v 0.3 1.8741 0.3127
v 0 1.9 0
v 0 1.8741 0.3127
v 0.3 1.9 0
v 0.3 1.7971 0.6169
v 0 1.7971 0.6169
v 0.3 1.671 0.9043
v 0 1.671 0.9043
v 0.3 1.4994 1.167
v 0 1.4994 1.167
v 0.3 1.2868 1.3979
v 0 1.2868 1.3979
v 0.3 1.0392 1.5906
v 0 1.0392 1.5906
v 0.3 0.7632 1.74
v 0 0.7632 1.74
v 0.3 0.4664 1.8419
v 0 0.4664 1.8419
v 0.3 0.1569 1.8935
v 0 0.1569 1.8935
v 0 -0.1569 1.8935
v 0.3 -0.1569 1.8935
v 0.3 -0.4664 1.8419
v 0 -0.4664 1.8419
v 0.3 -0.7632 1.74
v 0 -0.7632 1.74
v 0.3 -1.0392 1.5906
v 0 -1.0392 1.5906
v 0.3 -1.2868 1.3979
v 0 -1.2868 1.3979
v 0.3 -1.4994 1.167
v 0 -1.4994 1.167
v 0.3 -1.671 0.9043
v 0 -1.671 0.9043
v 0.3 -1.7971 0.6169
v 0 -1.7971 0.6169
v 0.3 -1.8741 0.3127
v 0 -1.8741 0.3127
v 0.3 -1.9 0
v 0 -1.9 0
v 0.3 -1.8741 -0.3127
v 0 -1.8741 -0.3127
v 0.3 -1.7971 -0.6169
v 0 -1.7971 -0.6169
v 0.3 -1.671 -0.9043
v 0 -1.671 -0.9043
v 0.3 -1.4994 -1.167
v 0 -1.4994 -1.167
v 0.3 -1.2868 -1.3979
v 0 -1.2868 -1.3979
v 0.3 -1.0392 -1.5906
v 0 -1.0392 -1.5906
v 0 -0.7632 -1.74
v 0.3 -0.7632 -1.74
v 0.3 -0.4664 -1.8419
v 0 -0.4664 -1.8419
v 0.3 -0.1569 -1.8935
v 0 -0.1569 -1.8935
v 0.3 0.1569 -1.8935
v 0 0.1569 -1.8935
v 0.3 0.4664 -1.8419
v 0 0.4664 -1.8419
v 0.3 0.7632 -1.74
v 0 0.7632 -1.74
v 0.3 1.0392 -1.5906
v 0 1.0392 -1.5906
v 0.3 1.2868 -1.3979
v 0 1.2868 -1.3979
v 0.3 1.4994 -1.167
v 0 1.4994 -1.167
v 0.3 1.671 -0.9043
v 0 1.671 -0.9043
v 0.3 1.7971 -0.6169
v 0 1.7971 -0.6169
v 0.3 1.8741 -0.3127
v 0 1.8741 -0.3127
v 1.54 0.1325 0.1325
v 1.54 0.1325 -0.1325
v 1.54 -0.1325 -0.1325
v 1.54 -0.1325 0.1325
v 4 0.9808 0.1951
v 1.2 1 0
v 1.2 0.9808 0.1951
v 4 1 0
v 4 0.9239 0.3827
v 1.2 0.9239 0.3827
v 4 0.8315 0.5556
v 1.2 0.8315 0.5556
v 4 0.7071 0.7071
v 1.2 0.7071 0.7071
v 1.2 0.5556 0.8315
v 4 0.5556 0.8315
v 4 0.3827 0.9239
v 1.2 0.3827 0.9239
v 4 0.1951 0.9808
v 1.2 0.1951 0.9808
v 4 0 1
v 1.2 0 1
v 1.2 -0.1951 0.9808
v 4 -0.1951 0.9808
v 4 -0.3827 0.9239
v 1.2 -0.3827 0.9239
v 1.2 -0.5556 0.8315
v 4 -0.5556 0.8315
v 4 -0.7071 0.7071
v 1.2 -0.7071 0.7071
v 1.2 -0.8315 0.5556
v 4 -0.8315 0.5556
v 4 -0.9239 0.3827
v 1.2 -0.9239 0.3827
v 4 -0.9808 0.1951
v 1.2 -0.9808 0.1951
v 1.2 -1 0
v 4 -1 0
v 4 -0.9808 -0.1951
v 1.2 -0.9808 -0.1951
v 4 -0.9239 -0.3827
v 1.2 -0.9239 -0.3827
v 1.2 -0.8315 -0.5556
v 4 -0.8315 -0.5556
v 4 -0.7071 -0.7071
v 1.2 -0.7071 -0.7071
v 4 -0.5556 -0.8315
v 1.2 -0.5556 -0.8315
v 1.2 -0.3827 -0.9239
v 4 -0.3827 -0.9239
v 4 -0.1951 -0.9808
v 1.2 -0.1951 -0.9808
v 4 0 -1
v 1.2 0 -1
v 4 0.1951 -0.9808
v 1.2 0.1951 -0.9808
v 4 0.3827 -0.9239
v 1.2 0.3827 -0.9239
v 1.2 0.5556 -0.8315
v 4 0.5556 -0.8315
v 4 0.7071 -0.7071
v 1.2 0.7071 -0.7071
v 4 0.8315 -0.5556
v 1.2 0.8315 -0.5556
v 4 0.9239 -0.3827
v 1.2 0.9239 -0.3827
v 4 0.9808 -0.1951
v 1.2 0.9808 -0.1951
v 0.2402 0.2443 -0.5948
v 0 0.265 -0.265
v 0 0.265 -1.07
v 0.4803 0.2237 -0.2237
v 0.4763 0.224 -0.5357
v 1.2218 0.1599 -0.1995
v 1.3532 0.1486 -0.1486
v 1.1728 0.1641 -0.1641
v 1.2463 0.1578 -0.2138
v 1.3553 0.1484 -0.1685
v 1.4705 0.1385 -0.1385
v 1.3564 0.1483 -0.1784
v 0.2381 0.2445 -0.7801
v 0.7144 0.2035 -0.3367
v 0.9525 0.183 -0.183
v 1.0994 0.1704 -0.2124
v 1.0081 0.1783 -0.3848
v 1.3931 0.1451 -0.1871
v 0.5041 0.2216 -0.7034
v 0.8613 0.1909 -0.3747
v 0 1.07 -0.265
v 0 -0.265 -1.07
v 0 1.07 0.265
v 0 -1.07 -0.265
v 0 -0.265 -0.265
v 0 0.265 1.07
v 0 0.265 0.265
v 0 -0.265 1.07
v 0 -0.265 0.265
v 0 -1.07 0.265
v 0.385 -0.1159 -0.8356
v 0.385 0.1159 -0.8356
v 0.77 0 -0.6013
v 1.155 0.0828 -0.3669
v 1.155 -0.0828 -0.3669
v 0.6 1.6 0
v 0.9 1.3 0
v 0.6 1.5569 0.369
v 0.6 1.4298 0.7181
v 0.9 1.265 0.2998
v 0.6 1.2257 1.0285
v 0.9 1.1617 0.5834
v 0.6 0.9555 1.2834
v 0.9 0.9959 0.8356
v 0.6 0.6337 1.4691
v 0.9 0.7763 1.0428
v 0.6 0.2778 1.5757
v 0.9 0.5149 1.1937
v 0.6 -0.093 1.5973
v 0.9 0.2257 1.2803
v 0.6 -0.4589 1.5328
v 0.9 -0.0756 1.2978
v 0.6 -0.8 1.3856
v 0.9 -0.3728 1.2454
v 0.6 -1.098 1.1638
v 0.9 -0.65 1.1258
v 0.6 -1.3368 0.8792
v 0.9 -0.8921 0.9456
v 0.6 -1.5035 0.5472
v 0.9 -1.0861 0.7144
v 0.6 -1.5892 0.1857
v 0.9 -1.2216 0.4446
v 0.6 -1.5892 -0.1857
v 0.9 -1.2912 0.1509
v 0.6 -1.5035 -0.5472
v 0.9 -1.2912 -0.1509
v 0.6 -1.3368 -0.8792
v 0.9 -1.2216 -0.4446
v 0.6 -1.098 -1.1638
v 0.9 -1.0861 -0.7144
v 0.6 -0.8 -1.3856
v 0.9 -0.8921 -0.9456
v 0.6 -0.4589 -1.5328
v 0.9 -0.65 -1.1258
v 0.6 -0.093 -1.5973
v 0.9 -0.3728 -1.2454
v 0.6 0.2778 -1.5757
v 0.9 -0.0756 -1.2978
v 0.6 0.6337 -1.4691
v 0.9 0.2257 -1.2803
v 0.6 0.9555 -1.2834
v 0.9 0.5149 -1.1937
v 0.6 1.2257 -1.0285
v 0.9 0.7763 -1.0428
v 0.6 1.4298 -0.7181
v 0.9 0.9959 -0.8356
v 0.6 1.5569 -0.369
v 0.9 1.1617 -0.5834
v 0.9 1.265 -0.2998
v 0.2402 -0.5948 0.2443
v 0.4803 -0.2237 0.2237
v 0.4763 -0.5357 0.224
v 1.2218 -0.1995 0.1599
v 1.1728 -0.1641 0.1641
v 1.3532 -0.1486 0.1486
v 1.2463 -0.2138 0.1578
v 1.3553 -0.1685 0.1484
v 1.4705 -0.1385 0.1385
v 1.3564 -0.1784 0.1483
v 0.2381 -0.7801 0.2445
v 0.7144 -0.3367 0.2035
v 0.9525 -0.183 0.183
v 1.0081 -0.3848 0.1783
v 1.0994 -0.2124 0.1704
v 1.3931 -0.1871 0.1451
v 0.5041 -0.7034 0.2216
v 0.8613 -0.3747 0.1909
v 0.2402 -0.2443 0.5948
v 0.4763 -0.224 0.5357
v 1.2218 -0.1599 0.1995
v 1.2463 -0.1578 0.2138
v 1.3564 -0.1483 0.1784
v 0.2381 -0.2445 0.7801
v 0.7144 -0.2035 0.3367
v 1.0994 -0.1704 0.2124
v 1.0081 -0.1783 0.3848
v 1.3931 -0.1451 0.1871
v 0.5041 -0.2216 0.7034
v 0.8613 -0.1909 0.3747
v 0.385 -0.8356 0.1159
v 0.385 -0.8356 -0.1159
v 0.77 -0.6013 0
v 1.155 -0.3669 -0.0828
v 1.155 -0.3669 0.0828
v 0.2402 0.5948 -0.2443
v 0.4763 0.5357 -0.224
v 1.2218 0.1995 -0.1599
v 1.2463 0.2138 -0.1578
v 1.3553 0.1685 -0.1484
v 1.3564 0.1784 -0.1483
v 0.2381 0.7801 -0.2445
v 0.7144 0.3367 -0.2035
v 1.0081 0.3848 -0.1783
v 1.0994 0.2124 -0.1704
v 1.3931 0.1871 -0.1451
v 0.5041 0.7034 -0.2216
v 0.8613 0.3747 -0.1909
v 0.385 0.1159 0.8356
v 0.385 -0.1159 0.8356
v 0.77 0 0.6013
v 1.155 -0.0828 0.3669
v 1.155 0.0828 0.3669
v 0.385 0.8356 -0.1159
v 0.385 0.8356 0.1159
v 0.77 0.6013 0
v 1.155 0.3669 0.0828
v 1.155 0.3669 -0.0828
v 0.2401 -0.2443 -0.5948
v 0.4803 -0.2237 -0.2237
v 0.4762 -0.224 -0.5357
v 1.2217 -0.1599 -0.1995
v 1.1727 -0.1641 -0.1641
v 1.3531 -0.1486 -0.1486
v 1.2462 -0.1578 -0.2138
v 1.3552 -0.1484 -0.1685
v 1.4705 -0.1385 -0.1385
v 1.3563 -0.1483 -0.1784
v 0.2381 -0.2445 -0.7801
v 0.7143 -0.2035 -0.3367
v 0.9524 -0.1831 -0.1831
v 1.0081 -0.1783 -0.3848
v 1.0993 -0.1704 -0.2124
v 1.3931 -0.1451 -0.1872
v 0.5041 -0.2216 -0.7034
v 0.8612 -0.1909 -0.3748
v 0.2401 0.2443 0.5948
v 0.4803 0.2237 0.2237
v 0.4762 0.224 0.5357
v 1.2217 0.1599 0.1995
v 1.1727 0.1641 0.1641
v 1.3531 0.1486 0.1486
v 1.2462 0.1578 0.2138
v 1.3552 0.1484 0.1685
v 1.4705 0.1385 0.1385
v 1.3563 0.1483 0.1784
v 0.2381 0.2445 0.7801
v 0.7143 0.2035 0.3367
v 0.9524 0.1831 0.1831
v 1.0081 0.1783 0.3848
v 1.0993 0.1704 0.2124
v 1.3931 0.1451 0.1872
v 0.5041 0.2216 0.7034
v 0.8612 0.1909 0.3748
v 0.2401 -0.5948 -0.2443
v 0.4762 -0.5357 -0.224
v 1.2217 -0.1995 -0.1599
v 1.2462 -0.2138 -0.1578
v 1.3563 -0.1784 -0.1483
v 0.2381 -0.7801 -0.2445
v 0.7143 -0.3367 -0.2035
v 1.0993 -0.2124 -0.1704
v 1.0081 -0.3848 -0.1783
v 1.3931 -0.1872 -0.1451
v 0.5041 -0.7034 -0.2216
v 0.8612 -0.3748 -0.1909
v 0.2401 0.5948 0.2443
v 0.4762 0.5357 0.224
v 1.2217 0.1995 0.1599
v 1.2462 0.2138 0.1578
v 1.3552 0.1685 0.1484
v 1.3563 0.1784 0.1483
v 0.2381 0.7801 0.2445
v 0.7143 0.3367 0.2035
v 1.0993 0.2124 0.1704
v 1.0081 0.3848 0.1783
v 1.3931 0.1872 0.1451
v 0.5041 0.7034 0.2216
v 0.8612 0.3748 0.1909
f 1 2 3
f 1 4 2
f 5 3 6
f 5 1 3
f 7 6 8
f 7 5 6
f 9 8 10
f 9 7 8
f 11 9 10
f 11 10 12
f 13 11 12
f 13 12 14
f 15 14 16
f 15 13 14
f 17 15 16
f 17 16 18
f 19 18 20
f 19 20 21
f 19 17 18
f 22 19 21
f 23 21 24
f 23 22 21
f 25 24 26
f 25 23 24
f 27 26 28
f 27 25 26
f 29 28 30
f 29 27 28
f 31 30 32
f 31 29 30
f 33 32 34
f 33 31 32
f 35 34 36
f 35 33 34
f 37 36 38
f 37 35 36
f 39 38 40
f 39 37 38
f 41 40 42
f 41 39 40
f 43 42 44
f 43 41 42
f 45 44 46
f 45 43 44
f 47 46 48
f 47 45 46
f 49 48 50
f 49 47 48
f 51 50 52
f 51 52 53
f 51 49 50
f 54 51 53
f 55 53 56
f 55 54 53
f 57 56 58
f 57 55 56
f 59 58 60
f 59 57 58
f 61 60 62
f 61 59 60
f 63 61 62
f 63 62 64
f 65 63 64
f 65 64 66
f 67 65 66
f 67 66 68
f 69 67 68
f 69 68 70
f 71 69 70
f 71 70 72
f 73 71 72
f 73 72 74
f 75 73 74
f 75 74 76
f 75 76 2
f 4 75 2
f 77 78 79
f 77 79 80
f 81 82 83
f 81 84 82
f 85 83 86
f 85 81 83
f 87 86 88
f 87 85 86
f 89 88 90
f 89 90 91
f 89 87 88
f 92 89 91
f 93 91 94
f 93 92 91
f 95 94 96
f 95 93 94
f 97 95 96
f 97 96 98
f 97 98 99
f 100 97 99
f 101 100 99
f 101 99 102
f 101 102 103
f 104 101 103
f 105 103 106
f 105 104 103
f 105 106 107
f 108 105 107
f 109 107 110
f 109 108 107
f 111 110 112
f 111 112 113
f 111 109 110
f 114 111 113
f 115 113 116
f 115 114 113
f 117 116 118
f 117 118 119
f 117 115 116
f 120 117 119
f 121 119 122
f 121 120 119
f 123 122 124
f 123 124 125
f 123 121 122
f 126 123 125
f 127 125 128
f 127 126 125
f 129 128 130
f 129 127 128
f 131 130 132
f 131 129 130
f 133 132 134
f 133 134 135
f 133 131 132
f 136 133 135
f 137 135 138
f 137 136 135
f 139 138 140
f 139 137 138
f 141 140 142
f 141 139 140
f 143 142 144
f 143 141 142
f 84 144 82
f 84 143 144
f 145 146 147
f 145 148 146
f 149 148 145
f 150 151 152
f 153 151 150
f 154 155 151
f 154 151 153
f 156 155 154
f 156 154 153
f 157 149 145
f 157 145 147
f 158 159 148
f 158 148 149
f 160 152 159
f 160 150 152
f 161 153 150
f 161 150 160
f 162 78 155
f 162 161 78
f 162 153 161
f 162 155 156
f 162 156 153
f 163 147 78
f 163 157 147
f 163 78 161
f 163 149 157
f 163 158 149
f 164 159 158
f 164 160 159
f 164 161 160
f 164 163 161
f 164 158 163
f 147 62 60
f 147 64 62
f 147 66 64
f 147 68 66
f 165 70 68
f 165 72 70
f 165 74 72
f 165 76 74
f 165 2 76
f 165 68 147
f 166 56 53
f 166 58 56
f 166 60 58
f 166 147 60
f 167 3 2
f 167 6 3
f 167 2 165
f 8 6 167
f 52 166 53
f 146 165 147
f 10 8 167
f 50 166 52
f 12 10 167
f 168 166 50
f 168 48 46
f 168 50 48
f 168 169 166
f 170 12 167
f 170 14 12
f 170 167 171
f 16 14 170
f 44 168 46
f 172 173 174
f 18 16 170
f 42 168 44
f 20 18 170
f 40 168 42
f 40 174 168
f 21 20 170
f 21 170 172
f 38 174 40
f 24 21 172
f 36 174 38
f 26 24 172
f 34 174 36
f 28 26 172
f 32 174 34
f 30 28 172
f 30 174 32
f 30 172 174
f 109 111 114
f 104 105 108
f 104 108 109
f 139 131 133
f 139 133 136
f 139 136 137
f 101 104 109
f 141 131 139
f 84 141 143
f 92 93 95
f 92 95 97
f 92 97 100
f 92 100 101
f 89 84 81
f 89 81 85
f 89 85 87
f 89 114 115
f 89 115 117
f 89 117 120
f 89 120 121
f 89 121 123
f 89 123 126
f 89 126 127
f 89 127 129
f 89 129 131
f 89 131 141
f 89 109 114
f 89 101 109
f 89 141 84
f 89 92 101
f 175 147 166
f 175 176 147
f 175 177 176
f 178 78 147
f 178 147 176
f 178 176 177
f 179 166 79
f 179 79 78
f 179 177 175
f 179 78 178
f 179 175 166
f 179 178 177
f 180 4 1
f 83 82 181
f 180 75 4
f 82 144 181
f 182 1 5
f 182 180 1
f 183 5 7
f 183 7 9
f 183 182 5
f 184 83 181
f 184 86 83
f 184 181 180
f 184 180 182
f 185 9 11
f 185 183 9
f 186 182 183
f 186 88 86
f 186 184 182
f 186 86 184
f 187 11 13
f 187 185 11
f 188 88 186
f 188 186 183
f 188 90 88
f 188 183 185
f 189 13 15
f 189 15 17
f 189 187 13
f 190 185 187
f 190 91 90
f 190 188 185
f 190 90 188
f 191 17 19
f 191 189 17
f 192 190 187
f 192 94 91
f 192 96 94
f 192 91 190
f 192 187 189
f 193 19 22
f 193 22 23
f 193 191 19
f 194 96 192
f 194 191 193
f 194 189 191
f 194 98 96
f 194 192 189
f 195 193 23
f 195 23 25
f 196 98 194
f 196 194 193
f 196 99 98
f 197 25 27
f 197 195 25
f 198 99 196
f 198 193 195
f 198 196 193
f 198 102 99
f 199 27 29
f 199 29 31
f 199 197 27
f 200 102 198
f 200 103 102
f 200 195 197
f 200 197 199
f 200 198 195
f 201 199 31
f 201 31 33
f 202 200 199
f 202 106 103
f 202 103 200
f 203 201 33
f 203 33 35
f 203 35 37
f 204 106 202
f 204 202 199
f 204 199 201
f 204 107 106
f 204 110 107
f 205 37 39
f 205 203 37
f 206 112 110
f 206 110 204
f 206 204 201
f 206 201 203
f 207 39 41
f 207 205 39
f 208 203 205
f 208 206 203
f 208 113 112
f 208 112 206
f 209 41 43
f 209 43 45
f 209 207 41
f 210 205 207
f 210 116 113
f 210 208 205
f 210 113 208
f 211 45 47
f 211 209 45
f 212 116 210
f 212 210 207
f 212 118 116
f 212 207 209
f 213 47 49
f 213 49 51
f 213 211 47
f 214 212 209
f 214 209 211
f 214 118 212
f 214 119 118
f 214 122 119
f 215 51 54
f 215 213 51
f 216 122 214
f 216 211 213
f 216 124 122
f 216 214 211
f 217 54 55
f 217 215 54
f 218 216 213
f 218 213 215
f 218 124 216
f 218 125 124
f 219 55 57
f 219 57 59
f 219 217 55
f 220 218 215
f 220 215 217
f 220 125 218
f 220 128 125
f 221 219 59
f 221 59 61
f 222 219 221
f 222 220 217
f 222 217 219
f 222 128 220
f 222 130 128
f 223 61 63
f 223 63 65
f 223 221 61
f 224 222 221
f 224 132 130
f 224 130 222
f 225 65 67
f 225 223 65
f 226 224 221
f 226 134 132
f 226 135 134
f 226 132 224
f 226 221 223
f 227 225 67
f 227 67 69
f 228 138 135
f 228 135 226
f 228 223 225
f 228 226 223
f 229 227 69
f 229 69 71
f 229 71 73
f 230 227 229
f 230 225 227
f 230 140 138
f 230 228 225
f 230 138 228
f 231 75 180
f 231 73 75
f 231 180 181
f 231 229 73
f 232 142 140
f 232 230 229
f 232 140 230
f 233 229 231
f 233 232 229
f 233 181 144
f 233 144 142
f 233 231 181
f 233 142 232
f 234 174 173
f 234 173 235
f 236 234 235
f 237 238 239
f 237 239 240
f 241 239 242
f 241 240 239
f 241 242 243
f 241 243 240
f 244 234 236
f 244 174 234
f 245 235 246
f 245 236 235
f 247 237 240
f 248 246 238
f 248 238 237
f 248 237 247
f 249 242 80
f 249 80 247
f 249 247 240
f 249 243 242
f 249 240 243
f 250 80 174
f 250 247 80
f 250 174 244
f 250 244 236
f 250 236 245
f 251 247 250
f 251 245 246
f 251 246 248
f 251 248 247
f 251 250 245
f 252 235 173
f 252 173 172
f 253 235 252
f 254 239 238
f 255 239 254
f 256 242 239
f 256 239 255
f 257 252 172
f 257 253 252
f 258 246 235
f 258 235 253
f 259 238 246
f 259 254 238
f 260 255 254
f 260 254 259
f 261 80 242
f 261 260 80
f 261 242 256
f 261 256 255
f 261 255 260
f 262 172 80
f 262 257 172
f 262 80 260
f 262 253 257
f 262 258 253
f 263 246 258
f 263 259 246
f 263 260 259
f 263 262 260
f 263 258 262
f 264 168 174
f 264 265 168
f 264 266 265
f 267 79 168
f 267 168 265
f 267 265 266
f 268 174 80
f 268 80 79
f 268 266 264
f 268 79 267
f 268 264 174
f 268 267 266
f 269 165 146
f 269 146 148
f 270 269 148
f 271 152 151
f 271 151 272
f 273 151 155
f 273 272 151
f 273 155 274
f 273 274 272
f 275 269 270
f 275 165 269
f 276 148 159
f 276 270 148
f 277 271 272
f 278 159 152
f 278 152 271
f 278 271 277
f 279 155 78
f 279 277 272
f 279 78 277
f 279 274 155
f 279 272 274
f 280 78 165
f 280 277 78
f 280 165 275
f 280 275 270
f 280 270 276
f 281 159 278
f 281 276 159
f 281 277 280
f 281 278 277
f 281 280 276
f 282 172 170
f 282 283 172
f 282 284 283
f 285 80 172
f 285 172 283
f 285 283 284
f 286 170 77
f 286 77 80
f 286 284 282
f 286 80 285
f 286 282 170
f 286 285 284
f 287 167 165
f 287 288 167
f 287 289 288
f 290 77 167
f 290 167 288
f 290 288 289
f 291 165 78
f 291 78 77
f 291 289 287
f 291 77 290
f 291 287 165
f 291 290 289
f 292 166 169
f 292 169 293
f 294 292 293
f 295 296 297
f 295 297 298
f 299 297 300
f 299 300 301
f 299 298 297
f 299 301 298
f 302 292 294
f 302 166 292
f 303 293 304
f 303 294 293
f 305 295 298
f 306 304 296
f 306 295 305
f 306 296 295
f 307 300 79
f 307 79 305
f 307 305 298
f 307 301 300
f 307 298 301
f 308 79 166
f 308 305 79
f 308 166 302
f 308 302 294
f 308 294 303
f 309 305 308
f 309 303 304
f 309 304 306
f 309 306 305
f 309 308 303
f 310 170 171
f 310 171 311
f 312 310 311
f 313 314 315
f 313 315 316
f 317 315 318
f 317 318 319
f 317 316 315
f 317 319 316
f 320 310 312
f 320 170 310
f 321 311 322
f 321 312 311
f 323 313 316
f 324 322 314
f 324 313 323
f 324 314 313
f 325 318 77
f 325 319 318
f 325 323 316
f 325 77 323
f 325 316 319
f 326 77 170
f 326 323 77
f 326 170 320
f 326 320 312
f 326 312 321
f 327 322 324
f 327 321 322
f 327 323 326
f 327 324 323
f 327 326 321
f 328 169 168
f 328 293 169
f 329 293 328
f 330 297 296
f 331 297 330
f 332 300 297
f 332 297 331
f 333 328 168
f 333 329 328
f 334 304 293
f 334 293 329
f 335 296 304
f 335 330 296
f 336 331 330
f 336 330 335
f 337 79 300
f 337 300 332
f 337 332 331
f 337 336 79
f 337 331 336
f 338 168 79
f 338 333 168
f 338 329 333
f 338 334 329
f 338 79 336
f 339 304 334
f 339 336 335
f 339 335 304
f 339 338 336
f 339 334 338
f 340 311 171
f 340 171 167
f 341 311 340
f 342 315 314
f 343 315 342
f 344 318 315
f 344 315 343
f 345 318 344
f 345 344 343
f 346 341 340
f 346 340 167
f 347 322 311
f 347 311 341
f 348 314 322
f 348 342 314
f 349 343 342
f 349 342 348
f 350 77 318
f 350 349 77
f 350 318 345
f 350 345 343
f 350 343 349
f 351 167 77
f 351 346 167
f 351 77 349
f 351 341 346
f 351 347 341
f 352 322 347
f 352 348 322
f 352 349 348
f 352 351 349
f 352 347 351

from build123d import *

# Parameters (mm, degrees)
SKETCH3_W         = 0.53
SKETCH3_H         = 2.14
SKETCH4_W         = 0.265
SKETCH4_H         = 0.265
CIRPATTERN1_COUNT = 2
CIRPATTERN1_ANGLE = 90


with BuildPart() as part:
    # BodySke → Base-Revolve (revolve)
    with BuildSketch(Plane.XY):
        Polygon((0, 0), (0, 1.9), (0.3, 1.9), (1.2, 1), (4, 1), (4, 0), align=None)
    revolve(axis=Axis((-6.35, 0, 0), (1, 0, 0)))

    # Sketch3 → Cross section 0
    with BuildSketch(Plane.ZY):
        Rectangle(SKETCH3_W, SKETCH3_H)
    # Sketch4 → Cross section 1
    with BuildSketch(Plane.ZY.offset(-1.54)):
        Rectangle(SKETCH4_W, SKETCH4_H)
    cross = loft(mode=Mode.SUBTRACT)

    # CirPattern1: Cross ×2 about axis
    cirpattern1_axis = Axis((0, 0, 0), (1, 0, 0))
    for i in range(1, CIRPATTERN1_COUNT):
        add(cross.rotate(cirpattern1_axis, i * CIRPATTERN1_ANGLE / (CIRPATTERN1_COUNT - 1)), mode=Mode.SUBTRACT)


solid = part.part
